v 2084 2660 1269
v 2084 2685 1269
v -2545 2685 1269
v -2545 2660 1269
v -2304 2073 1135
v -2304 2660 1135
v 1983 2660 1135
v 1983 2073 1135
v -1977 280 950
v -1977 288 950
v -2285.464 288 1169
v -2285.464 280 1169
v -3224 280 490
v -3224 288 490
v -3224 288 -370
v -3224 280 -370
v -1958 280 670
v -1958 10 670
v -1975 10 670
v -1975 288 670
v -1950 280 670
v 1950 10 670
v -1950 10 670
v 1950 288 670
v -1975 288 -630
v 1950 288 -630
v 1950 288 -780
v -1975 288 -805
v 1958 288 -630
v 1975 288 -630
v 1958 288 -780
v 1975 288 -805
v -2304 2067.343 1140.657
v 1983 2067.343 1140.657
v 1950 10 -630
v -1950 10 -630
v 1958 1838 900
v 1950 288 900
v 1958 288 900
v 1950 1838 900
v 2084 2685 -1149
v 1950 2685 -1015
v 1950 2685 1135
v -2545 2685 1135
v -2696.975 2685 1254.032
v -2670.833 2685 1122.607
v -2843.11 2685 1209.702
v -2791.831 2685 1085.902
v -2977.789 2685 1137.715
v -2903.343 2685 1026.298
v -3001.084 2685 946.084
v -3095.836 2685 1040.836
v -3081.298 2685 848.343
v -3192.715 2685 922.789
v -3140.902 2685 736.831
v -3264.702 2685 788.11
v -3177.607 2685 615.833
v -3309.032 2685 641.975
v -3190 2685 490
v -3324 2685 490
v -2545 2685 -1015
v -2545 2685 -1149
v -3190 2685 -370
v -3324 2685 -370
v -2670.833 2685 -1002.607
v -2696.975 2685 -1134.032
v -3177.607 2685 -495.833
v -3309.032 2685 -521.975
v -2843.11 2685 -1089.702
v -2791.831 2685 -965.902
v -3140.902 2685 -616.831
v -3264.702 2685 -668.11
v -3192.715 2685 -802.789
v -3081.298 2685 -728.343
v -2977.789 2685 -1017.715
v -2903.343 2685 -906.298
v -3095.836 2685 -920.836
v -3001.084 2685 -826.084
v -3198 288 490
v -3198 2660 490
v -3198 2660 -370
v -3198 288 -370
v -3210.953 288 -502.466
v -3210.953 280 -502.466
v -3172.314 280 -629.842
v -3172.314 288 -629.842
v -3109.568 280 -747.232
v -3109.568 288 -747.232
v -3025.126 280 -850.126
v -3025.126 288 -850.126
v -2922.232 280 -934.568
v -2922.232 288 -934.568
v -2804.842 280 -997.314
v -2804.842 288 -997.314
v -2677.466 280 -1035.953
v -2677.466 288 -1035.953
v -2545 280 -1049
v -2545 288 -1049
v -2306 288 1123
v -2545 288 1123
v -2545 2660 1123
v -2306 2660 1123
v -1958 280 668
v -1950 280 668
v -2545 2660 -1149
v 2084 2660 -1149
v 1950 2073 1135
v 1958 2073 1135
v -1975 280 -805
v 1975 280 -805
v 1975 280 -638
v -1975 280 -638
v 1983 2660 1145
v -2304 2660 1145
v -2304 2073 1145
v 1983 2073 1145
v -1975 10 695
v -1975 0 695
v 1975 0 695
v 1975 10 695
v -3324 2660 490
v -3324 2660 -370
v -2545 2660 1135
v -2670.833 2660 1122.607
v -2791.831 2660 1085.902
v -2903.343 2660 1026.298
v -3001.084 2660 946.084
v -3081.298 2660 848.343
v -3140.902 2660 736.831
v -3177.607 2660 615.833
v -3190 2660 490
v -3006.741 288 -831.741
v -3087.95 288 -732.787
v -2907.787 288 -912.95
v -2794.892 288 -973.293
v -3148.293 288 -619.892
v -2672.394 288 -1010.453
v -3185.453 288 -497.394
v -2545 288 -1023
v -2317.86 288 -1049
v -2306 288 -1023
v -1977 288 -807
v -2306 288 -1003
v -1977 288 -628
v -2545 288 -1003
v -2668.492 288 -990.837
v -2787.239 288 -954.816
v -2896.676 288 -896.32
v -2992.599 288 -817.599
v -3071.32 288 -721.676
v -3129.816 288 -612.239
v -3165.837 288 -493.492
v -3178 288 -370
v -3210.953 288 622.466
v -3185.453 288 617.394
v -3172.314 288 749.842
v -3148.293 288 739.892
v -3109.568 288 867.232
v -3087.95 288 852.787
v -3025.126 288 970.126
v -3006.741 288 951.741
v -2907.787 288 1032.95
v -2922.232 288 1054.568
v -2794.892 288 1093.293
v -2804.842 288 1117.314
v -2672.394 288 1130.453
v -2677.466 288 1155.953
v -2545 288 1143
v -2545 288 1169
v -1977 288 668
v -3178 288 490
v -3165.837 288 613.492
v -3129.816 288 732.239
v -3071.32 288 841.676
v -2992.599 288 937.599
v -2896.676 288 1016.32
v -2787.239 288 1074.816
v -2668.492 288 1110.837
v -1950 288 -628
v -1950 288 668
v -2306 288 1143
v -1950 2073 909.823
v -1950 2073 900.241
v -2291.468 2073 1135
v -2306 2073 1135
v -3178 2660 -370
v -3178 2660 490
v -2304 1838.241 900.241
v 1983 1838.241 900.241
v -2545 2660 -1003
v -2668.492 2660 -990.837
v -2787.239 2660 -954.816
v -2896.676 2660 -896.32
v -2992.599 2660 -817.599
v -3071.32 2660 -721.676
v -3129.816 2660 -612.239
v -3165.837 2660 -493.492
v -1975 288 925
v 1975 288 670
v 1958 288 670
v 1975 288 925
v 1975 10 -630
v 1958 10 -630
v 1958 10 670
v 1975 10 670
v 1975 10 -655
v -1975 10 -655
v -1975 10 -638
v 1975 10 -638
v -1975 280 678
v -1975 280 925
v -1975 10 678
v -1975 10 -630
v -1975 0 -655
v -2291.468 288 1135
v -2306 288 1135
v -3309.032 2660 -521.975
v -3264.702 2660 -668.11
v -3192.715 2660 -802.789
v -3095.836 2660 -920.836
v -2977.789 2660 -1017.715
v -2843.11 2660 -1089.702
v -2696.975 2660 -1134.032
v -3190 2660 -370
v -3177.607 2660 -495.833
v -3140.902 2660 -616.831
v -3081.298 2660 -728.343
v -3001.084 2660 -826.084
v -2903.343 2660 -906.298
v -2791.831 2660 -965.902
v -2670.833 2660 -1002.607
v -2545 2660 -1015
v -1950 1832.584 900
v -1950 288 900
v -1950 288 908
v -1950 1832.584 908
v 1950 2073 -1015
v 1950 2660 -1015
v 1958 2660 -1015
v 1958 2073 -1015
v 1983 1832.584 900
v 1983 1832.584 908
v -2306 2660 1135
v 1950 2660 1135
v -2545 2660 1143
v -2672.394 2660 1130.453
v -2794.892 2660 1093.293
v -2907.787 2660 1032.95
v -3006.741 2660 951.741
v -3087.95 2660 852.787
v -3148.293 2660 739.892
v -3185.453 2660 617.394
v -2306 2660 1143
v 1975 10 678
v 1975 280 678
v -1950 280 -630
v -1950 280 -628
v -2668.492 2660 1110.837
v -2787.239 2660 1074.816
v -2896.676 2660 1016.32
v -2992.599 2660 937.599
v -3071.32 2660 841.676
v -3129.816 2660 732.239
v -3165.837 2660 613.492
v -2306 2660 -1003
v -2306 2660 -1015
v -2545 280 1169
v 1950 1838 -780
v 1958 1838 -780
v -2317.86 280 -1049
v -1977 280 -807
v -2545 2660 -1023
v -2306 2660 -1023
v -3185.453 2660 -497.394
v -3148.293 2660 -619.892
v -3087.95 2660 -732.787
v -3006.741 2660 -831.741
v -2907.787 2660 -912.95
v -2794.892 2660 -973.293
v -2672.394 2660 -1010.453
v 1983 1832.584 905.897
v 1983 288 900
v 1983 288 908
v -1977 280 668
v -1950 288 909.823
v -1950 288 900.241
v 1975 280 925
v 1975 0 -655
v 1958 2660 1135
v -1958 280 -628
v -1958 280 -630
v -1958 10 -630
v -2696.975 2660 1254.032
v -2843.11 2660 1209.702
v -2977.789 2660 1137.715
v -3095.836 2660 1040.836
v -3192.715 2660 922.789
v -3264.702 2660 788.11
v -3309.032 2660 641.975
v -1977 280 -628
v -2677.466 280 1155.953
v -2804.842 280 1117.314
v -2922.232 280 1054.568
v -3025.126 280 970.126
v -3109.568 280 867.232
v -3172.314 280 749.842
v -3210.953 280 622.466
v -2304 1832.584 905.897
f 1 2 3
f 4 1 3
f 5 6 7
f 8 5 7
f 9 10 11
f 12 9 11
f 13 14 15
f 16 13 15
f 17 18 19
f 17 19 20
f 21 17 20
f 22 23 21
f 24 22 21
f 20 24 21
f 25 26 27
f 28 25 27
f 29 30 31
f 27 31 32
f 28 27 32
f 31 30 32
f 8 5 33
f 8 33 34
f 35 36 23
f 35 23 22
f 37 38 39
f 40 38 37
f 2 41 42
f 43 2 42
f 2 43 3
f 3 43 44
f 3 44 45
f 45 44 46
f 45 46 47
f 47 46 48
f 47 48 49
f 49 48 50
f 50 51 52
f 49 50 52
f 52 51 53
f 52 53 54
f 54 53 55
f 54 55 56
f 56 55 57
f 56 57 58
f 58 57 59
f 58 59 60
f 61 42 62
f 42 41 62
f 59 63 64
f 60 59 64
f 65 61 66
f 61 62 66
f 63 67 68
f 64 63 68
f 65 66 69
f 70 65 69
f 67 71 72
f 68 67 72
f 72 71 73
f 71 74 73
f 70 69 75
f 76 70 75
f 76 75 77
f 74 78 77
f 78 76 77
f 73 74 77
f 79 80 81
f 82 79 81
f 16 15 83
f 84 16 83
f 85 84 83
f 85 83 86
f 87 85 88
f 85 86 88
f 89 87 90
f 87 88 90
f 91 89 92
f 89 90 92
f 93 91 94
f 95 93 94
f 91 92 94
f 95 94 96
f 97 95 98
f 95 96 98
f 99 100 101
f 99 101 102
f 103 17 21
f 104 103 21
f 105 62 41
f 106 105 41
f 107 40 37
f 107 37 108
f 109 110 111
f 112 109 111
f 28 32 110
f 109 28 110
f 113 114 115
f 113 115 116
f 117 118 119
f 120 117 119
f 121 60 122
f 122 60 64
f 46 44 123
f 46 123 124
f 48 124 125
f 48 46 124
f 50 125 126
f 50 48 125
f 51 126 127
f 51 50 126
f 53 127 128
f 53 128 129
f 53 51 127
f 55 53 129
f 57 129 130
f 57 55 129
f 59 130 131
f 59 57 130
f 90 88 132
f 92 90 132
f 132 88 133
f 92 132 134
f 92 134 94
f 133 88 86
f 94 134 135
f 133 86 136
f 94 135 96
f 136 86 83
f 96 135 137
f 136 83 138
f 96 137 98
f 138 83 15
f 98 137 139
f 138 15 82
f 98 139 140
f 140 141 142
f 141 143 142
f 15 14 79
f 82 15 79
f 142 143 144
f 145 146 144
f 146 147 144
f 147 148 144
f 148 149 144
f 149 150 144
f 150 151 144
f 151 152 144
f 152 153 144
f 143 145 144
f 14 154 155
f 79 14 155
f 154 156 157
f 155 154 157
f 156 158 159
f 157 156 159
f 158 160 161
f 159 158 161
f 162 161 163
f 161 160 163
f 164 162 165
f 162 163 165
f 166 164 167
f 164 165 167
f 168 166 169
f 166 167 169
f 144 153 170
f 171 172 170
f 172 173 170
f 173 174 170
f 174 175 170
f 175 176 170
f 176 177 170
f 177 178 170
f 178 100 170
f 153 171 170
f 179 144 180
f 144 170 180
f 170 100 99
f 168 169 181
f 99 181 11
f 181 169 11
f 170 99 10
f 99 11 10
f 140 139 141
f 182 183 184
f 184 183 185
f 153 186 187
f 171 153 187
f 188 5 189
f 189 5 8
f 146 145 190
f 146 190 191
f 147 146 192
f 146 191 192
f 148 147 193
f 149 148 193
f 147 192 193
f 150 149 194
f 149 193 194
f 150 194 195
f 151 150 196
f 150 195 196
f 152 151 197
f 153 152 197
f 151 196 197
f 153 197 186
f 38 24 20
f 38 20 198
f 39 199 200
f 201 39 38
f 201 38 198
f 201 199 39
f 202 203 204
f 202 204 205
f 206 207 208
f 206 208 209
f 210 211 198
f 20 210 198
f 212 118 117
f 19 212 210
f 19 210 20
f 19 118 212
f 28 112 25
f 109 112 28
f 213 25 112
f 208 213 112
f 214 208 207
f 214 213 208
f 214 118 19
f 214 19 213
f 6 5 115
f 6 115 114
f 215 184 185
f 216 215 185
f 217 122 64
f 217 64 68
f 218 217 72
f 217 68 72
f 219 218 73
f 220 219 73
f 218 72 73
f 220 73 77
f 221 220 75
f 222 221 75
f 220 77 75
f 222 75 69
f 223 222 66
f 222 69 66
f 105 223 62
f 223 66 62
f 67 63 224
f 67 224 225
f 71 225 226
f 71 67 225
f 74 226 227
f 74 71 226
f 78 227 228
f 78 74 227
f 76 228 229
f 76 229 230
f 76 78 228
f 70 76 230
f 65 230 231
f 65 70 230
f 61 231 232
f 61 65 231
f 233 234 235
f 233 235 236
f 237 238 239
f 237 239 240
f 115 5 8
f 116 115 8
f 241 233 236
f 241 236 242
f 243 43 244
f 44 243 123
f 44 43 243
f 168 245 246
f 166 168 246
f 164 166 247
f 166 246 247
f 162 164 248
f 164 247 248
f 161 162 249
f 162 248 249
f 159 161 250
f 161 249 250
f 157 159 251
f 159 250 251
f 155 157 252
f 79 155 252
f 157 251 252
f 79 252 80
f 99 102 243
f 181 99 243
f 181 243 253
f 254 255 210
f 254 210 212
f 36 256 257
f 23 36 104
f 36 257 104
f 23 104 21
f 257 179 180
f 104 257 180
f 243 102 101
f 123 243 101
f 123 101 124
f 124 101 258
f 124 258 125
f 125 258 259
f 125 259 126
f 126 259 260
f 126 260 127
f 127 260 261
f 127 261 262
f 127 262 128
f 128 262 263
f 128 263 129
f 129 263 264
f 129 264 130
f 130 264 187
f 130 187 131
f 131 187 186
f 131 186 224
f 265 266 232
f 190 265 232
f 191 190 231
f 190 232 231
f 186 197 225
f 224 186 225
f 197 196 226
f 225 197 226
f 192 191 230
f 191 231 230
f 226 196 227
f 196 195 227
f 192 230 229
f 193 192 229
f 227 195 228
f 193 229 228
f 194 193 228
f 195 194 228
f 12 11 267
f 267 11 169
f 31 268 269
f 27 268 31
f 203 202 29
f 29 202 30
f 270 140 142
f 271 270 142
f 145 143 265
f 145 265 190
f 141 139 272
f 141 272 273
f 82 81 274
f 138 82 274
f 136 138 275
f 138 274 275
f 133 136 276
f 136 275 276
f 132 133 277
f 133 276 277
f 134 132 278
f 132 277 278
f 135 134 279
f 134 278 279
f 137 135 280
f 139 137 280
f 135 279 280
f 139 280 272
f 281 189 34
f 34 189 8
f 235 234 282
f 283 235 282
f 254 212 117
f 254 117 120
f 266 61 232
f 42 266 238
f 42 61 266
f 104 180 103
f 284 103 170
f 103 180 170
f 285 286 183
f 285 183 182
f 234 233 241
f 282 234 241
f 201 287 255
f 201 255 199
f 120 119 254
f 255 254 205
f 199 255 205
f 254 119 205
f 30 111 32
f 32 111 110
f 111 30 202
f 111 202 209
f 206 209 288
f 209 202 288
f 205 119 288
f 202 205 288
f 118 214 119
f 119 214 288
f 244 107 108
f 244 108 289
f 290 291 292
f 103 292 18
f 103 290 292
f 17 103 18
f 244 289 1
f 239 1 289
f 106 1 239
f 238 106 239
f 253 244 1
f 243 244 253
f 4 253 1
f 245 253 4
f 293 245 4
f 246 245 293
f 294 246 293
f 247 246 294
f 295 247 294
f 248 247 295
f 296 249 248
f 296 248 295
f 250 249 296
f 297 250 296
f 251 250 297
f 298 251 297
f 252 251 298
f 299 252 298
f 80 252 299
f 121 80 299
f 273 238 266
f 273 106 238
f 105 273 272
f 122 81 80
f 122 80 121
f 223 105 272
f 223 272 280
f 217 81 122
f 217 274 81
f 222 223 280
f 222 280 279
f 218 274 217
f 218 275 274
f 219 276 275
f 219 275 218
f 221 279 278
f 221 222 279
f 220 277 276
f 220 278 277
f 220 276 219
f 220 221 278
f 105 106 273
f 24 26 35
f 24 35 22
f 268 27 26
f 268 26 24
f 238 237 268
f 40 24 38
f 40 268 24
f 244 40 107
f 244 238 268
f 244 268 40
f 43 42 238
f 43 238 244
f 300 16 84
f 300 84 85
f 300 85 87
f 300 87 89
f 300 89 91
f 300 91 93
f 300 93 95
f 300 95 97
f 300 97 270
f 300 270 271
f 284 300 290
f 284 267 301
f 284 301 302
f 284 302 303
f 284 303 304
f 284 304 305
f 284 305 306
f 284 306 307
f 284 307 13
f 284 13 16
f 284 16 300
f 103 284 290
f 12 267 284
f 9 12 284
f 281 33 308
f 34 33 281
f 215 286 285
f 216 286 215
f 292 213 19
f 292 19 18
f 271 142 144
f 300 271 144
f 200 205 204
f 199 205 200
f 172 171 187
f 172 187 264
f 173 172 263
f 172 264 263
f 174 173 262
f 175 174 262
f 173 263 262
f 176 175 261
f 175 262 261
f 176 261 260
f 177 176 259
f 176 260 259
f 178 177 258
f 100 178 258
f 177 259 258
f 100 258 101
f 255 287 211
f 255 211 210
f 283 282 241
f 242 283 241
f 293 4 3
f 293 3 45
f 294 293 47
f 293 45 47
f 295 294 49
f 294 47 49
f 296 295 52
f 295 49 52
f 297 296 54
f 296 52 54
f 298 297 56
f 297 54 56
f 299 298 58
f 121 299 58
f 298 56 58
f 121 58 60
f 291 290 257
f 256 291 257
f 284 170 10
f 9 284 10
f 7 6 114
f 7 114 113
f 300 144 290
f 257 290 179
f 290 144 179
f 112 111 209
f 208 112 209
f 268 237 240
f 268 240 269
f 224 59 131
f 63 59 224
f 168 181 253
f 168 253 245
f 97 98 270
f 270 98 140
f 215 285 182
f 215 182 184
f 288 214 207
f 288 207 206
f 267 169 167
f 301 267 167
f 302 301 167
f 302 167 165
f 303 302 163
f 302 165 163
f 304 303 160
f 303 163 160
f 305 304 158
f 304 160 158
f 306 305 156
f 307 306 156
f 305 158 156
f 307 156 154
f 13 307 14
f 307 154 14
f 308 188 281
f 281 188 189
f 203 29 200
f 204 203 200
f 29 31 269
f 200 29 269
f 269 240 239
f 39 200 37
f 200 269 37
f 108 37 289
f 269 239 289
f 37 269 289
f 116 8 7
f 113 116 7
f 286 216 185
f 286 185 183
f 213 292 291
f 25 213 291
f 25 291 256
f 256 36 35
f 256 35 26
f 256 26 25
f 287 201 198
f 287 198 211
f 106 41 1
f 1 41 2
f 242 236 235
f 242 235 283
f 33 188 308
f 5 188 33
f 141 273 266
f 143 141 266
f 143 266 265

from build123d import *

# Parameters (mm, degrees)
SKETCH2_W                = 3950
SKETCH2_H                = 1350
BOTTOM_10_MM_DEPTH       = 10
BEND_BOTTOM_8_MM_DEPTH   = 3950
BACK_8_MM_DEPTH          = 8
CURB_25_DEPTH            = 25
FRONT_ROUND_DEPTH        = 2372
BEND_BOTTOM_8_MM_2_DEPTH = 8
SKETCH8_W                = 8
SKETCH8_H                = 1300
BOTTOM_LOWER_DEPTH       = 270
SKETCH9_W                = 4287
SKETCH9_H                = 587
HV_UPPER_DEPTH           = 10
SKETCH10_W               = 4287
SKETCH10_H               = 332
HV_MID_DEPTH             = 8
SKETCH11_W               = 3933
SKETCH11_H               = 1544.583694397
HV_LOWER_DEPTH           = 8
TEDA_WALA_HV_LV_DEPTH    = 1785


with BuildPart() as part:
    # Sketch2 → bottom 10 mm (new body)
    with BuildSketch(Plane(origin=(0, 0, 0), x_dir=(1, 0, 0), z_dir=(0, 1, 0))):
        with Locations((0, -20)):
            Rectangle(SKETCH2_W, SKETCH2_H)
    extrude(amount=BOTTOM_10_MM_DEPTH)

    # Sketch3 → bend bottom 8 mm (add)
    with BuildSketch(Plane(origin=(1975, 0, 0), x_dir=(0, 0, -1), z_dir=(1, 0, 0))):
        Polygon((-670, 10), (-670, 288), (-925, 288), (-925, 280), (-678, 280), (-678, 10), align=None)
        Polygon((630, 10), (630, 288), (805, 288), (805, 280), (638, 280), (638, 10), align=None)
    extrude(amount=-BEND_BOTTOM_8_MM_DEPTH)

    # Sketch4 → back 8 mm (add)
    with BuildSketch(Plane(origin=(1950, 0, 0), x_dir=(0, 0, -1), z_dir=(1, 0, 0))):
        Polygon((-1135, 2685), (1015, 2685), (1015, 2073), (780, 1838), (780, 288), (630, 288), (630, 10), (-670, 10), (-670, 288), (-900, 288), (-900, 1838), (-1135, 2073), align=None)
    extrude(amount=BACK_8_MM_DEPTH)

    # Sketch5 → CURB 25 (add)
    with BuildSketch(Plane(origin=(0, 2685, 0), x_dir=(1, 0, 0), z_dir=(0, 1, 0))):
        with BuildLine():
            Line((-2545, 1149), (2084, 1149))
            Line((2084, 1149), (2084, -1269))
            Line((2084, -1269), (-2545, -1269))
            ThreePointArc((-2545, -1269), (-3095.836182544, -1040.836182544), (-3324, -490))
            Line((-3324, -490), (-3324, 370))
            ThreePointArc((-3324, 370), (-3095.836182544, 920.836182544), (-2545, 1149))
        make_face()
        with BuildLine():
            Line((-2545, 1015), (1950, 1015))
            Line((1950, 1015), (1950, -1135))
            Line((1950, -1135), (-2545, -1135))
            ThreePointArc((-2545, -1135), (-3001.083873865, -946.083873865), (-3190, -490))
            Line((-3190, -490), (-3190, 370))
            ThreePointArc((-3190, 370), (-3001.083873865, 826.083873865), (-2545, 1015))
        make_face(mode=Mode.SUBTRACT)
    extrude(amount=-CURB_25_DEPTH)

    # Sketch6 → front round (add)
    with BuildSketch(Plane(origin=(0, 2660, 0), x_dir=(-1, 0, 0), z_dir=(0, -1, 0))):
        with BuildLine():
            Line((2306, 1015), (2545, 1015))
            ThreePointArc((2545, 1015), (3001.083873865, 826.083873865), (3190, 370))
            Line((3190, 370), (3190, -490))
            ThreePointArc((3190, -490), (3001.083873865, -946.083873865), (2545, -1135))
            Line((2545, -1135), (2306, -1135))
            Line((2306, -1135), (2306, -1123))
            Line((2306, -1123), (2545, -1123))
            ThreePointArc((2545, -1123), (2992.598592491, -937.598592491), (3178, -490))
            Line((3178, -490), (3178, 370))
            ThreePointArc((3178, 370), (2992.598592491, 817.598592491), (2545, 1003))
            Line((2545, 1003), (2306, 1003))
            Line((2306, 1003), (2306, 1015))
        make_face()
        with BuildLine():
            Line((2306, -1143), (2545, -1143))
            ThreePointArc((2545, -1143), (3006.740728115, -951.740728115), (3198, -490))
            Line((3198, -490), (3198, 370))
            ThreePointArc((3198, 370), (3006.740728115, 831.740728115), (2545, 1023))
            Line((2545, 1023), (2306, 1023))
            Line((2306, 1023), (2306, 1011))
            Line((2306, 1011), (2545, 1011))
            ThreePointArc((2545, 1011), (2998.255446741, 823.255446741), (3186, 370))
            Line((3186, 370), (3186, -490))
            ThreePointArc((3186, -490), (2998.255446741, -943.255446741), (2545, -1131))
            Line((2545, -1131), (2306, -1131))
            Line((2306, -1131), (2306, -1143))
        make_face()
    extrude(amount=FRONT_ROUND_DEPTH)

    # Sketch7 → bend bottom 8 mm 2 (add)
    with BuildSketch(Plane.XZ.offset(-288)):
        with BuildLine():
            Line((-2545, -1049), (-2317.859574468, -1049))
            Line((-2317.859574468, -1049), (-1977, -807))
            Line((-1977, -807), (-1977, -628))
            Line((-1977, -628), (-1950, -628))
            Line((-1950, -628), (-1950, 668))
            Line((-1950, 668), (-1977, 668))
            Line((-1977, 668), (-1977, 950))
            Line((-1977, 950), (-2285.463829787, 1169))
            Line((-2285.463829787, 1169), (-2545, 1169))
            ThreePointArc((-2545, 1169), (-3025.125504426, 970.125504426), (-3224, 490))
            Line((-3224, 490), (-3224, -370))
            ThreePointArc((-3224, -370), (-3025.125504426, -850.125504426), (-2545, -1049))
        make_face()
    extrude(amount=BEND_BOTTOM_8_MM_2_DEPTH)

    # Sketch8 → bottom lower (add)
    with BuildSketch(Plane.XZ.offset(-280)):
        with Locations((-1954, 20)):
            Rectangle(SKETCH8_W, SKETCH8_H)
    extrude(amount=BOTTOM_LOWER_DEPTH)


with BuildPart() as body_2:
    # Sketch9 → hv upper (new body)
    with BuildSketch(Plane.XY.offset(1135)):
        with Locations((-160.5, 2366.5)):
            Rectangle(SKETCH9_W, SKETCH9_H)
    extrude(amount=HV_UPPER_DEPTH)


with BuildPart() as body_3:
    # Sketch10 → hv mid (new body)
    with BuildSketch(Plane(origin=(0, 469, -469), x_dir=(1, 0, 0), z_dir=(0, -0.7071067811865479, 0.7071067811865472))):
        with Locations((-160.5, 2102.398554046)):
            Rectangle(SKETCH10_W, SKETCH10_H)
    extrude(amount=HV_MID_DEPTH)


with BuildPart() as body_4:
    # Sketch11 → HV lower (new body)
    with BuildSketch(Plane.XY.offset(900)):
        with Locations((16.5, 1060.291847198)):
            Rectangle(SKETCH11_W, SKETCH11_H)
    extrude(amount=HV_LOWER_DEPTH)


with BuildPart() as body_5:
    # Sketch12 → teda wala hv lv (new body)
    with BuildSketch(Plane(origin=(0, 288, 0), x_dir=(1, 0, 0), z_dir=(0, 1, 0))):
        Polygon((-2306, -1135), (-1950, -900.240548646), (-1950, -909.82338901), (-2291.468141326, -1135), align=None)
    extrude(amount=TEDA_WALA_HV_LV_DEPTH)


solid = Compound([part.part, body_2.part, body_3.part, body_4.part, body_5.part])
